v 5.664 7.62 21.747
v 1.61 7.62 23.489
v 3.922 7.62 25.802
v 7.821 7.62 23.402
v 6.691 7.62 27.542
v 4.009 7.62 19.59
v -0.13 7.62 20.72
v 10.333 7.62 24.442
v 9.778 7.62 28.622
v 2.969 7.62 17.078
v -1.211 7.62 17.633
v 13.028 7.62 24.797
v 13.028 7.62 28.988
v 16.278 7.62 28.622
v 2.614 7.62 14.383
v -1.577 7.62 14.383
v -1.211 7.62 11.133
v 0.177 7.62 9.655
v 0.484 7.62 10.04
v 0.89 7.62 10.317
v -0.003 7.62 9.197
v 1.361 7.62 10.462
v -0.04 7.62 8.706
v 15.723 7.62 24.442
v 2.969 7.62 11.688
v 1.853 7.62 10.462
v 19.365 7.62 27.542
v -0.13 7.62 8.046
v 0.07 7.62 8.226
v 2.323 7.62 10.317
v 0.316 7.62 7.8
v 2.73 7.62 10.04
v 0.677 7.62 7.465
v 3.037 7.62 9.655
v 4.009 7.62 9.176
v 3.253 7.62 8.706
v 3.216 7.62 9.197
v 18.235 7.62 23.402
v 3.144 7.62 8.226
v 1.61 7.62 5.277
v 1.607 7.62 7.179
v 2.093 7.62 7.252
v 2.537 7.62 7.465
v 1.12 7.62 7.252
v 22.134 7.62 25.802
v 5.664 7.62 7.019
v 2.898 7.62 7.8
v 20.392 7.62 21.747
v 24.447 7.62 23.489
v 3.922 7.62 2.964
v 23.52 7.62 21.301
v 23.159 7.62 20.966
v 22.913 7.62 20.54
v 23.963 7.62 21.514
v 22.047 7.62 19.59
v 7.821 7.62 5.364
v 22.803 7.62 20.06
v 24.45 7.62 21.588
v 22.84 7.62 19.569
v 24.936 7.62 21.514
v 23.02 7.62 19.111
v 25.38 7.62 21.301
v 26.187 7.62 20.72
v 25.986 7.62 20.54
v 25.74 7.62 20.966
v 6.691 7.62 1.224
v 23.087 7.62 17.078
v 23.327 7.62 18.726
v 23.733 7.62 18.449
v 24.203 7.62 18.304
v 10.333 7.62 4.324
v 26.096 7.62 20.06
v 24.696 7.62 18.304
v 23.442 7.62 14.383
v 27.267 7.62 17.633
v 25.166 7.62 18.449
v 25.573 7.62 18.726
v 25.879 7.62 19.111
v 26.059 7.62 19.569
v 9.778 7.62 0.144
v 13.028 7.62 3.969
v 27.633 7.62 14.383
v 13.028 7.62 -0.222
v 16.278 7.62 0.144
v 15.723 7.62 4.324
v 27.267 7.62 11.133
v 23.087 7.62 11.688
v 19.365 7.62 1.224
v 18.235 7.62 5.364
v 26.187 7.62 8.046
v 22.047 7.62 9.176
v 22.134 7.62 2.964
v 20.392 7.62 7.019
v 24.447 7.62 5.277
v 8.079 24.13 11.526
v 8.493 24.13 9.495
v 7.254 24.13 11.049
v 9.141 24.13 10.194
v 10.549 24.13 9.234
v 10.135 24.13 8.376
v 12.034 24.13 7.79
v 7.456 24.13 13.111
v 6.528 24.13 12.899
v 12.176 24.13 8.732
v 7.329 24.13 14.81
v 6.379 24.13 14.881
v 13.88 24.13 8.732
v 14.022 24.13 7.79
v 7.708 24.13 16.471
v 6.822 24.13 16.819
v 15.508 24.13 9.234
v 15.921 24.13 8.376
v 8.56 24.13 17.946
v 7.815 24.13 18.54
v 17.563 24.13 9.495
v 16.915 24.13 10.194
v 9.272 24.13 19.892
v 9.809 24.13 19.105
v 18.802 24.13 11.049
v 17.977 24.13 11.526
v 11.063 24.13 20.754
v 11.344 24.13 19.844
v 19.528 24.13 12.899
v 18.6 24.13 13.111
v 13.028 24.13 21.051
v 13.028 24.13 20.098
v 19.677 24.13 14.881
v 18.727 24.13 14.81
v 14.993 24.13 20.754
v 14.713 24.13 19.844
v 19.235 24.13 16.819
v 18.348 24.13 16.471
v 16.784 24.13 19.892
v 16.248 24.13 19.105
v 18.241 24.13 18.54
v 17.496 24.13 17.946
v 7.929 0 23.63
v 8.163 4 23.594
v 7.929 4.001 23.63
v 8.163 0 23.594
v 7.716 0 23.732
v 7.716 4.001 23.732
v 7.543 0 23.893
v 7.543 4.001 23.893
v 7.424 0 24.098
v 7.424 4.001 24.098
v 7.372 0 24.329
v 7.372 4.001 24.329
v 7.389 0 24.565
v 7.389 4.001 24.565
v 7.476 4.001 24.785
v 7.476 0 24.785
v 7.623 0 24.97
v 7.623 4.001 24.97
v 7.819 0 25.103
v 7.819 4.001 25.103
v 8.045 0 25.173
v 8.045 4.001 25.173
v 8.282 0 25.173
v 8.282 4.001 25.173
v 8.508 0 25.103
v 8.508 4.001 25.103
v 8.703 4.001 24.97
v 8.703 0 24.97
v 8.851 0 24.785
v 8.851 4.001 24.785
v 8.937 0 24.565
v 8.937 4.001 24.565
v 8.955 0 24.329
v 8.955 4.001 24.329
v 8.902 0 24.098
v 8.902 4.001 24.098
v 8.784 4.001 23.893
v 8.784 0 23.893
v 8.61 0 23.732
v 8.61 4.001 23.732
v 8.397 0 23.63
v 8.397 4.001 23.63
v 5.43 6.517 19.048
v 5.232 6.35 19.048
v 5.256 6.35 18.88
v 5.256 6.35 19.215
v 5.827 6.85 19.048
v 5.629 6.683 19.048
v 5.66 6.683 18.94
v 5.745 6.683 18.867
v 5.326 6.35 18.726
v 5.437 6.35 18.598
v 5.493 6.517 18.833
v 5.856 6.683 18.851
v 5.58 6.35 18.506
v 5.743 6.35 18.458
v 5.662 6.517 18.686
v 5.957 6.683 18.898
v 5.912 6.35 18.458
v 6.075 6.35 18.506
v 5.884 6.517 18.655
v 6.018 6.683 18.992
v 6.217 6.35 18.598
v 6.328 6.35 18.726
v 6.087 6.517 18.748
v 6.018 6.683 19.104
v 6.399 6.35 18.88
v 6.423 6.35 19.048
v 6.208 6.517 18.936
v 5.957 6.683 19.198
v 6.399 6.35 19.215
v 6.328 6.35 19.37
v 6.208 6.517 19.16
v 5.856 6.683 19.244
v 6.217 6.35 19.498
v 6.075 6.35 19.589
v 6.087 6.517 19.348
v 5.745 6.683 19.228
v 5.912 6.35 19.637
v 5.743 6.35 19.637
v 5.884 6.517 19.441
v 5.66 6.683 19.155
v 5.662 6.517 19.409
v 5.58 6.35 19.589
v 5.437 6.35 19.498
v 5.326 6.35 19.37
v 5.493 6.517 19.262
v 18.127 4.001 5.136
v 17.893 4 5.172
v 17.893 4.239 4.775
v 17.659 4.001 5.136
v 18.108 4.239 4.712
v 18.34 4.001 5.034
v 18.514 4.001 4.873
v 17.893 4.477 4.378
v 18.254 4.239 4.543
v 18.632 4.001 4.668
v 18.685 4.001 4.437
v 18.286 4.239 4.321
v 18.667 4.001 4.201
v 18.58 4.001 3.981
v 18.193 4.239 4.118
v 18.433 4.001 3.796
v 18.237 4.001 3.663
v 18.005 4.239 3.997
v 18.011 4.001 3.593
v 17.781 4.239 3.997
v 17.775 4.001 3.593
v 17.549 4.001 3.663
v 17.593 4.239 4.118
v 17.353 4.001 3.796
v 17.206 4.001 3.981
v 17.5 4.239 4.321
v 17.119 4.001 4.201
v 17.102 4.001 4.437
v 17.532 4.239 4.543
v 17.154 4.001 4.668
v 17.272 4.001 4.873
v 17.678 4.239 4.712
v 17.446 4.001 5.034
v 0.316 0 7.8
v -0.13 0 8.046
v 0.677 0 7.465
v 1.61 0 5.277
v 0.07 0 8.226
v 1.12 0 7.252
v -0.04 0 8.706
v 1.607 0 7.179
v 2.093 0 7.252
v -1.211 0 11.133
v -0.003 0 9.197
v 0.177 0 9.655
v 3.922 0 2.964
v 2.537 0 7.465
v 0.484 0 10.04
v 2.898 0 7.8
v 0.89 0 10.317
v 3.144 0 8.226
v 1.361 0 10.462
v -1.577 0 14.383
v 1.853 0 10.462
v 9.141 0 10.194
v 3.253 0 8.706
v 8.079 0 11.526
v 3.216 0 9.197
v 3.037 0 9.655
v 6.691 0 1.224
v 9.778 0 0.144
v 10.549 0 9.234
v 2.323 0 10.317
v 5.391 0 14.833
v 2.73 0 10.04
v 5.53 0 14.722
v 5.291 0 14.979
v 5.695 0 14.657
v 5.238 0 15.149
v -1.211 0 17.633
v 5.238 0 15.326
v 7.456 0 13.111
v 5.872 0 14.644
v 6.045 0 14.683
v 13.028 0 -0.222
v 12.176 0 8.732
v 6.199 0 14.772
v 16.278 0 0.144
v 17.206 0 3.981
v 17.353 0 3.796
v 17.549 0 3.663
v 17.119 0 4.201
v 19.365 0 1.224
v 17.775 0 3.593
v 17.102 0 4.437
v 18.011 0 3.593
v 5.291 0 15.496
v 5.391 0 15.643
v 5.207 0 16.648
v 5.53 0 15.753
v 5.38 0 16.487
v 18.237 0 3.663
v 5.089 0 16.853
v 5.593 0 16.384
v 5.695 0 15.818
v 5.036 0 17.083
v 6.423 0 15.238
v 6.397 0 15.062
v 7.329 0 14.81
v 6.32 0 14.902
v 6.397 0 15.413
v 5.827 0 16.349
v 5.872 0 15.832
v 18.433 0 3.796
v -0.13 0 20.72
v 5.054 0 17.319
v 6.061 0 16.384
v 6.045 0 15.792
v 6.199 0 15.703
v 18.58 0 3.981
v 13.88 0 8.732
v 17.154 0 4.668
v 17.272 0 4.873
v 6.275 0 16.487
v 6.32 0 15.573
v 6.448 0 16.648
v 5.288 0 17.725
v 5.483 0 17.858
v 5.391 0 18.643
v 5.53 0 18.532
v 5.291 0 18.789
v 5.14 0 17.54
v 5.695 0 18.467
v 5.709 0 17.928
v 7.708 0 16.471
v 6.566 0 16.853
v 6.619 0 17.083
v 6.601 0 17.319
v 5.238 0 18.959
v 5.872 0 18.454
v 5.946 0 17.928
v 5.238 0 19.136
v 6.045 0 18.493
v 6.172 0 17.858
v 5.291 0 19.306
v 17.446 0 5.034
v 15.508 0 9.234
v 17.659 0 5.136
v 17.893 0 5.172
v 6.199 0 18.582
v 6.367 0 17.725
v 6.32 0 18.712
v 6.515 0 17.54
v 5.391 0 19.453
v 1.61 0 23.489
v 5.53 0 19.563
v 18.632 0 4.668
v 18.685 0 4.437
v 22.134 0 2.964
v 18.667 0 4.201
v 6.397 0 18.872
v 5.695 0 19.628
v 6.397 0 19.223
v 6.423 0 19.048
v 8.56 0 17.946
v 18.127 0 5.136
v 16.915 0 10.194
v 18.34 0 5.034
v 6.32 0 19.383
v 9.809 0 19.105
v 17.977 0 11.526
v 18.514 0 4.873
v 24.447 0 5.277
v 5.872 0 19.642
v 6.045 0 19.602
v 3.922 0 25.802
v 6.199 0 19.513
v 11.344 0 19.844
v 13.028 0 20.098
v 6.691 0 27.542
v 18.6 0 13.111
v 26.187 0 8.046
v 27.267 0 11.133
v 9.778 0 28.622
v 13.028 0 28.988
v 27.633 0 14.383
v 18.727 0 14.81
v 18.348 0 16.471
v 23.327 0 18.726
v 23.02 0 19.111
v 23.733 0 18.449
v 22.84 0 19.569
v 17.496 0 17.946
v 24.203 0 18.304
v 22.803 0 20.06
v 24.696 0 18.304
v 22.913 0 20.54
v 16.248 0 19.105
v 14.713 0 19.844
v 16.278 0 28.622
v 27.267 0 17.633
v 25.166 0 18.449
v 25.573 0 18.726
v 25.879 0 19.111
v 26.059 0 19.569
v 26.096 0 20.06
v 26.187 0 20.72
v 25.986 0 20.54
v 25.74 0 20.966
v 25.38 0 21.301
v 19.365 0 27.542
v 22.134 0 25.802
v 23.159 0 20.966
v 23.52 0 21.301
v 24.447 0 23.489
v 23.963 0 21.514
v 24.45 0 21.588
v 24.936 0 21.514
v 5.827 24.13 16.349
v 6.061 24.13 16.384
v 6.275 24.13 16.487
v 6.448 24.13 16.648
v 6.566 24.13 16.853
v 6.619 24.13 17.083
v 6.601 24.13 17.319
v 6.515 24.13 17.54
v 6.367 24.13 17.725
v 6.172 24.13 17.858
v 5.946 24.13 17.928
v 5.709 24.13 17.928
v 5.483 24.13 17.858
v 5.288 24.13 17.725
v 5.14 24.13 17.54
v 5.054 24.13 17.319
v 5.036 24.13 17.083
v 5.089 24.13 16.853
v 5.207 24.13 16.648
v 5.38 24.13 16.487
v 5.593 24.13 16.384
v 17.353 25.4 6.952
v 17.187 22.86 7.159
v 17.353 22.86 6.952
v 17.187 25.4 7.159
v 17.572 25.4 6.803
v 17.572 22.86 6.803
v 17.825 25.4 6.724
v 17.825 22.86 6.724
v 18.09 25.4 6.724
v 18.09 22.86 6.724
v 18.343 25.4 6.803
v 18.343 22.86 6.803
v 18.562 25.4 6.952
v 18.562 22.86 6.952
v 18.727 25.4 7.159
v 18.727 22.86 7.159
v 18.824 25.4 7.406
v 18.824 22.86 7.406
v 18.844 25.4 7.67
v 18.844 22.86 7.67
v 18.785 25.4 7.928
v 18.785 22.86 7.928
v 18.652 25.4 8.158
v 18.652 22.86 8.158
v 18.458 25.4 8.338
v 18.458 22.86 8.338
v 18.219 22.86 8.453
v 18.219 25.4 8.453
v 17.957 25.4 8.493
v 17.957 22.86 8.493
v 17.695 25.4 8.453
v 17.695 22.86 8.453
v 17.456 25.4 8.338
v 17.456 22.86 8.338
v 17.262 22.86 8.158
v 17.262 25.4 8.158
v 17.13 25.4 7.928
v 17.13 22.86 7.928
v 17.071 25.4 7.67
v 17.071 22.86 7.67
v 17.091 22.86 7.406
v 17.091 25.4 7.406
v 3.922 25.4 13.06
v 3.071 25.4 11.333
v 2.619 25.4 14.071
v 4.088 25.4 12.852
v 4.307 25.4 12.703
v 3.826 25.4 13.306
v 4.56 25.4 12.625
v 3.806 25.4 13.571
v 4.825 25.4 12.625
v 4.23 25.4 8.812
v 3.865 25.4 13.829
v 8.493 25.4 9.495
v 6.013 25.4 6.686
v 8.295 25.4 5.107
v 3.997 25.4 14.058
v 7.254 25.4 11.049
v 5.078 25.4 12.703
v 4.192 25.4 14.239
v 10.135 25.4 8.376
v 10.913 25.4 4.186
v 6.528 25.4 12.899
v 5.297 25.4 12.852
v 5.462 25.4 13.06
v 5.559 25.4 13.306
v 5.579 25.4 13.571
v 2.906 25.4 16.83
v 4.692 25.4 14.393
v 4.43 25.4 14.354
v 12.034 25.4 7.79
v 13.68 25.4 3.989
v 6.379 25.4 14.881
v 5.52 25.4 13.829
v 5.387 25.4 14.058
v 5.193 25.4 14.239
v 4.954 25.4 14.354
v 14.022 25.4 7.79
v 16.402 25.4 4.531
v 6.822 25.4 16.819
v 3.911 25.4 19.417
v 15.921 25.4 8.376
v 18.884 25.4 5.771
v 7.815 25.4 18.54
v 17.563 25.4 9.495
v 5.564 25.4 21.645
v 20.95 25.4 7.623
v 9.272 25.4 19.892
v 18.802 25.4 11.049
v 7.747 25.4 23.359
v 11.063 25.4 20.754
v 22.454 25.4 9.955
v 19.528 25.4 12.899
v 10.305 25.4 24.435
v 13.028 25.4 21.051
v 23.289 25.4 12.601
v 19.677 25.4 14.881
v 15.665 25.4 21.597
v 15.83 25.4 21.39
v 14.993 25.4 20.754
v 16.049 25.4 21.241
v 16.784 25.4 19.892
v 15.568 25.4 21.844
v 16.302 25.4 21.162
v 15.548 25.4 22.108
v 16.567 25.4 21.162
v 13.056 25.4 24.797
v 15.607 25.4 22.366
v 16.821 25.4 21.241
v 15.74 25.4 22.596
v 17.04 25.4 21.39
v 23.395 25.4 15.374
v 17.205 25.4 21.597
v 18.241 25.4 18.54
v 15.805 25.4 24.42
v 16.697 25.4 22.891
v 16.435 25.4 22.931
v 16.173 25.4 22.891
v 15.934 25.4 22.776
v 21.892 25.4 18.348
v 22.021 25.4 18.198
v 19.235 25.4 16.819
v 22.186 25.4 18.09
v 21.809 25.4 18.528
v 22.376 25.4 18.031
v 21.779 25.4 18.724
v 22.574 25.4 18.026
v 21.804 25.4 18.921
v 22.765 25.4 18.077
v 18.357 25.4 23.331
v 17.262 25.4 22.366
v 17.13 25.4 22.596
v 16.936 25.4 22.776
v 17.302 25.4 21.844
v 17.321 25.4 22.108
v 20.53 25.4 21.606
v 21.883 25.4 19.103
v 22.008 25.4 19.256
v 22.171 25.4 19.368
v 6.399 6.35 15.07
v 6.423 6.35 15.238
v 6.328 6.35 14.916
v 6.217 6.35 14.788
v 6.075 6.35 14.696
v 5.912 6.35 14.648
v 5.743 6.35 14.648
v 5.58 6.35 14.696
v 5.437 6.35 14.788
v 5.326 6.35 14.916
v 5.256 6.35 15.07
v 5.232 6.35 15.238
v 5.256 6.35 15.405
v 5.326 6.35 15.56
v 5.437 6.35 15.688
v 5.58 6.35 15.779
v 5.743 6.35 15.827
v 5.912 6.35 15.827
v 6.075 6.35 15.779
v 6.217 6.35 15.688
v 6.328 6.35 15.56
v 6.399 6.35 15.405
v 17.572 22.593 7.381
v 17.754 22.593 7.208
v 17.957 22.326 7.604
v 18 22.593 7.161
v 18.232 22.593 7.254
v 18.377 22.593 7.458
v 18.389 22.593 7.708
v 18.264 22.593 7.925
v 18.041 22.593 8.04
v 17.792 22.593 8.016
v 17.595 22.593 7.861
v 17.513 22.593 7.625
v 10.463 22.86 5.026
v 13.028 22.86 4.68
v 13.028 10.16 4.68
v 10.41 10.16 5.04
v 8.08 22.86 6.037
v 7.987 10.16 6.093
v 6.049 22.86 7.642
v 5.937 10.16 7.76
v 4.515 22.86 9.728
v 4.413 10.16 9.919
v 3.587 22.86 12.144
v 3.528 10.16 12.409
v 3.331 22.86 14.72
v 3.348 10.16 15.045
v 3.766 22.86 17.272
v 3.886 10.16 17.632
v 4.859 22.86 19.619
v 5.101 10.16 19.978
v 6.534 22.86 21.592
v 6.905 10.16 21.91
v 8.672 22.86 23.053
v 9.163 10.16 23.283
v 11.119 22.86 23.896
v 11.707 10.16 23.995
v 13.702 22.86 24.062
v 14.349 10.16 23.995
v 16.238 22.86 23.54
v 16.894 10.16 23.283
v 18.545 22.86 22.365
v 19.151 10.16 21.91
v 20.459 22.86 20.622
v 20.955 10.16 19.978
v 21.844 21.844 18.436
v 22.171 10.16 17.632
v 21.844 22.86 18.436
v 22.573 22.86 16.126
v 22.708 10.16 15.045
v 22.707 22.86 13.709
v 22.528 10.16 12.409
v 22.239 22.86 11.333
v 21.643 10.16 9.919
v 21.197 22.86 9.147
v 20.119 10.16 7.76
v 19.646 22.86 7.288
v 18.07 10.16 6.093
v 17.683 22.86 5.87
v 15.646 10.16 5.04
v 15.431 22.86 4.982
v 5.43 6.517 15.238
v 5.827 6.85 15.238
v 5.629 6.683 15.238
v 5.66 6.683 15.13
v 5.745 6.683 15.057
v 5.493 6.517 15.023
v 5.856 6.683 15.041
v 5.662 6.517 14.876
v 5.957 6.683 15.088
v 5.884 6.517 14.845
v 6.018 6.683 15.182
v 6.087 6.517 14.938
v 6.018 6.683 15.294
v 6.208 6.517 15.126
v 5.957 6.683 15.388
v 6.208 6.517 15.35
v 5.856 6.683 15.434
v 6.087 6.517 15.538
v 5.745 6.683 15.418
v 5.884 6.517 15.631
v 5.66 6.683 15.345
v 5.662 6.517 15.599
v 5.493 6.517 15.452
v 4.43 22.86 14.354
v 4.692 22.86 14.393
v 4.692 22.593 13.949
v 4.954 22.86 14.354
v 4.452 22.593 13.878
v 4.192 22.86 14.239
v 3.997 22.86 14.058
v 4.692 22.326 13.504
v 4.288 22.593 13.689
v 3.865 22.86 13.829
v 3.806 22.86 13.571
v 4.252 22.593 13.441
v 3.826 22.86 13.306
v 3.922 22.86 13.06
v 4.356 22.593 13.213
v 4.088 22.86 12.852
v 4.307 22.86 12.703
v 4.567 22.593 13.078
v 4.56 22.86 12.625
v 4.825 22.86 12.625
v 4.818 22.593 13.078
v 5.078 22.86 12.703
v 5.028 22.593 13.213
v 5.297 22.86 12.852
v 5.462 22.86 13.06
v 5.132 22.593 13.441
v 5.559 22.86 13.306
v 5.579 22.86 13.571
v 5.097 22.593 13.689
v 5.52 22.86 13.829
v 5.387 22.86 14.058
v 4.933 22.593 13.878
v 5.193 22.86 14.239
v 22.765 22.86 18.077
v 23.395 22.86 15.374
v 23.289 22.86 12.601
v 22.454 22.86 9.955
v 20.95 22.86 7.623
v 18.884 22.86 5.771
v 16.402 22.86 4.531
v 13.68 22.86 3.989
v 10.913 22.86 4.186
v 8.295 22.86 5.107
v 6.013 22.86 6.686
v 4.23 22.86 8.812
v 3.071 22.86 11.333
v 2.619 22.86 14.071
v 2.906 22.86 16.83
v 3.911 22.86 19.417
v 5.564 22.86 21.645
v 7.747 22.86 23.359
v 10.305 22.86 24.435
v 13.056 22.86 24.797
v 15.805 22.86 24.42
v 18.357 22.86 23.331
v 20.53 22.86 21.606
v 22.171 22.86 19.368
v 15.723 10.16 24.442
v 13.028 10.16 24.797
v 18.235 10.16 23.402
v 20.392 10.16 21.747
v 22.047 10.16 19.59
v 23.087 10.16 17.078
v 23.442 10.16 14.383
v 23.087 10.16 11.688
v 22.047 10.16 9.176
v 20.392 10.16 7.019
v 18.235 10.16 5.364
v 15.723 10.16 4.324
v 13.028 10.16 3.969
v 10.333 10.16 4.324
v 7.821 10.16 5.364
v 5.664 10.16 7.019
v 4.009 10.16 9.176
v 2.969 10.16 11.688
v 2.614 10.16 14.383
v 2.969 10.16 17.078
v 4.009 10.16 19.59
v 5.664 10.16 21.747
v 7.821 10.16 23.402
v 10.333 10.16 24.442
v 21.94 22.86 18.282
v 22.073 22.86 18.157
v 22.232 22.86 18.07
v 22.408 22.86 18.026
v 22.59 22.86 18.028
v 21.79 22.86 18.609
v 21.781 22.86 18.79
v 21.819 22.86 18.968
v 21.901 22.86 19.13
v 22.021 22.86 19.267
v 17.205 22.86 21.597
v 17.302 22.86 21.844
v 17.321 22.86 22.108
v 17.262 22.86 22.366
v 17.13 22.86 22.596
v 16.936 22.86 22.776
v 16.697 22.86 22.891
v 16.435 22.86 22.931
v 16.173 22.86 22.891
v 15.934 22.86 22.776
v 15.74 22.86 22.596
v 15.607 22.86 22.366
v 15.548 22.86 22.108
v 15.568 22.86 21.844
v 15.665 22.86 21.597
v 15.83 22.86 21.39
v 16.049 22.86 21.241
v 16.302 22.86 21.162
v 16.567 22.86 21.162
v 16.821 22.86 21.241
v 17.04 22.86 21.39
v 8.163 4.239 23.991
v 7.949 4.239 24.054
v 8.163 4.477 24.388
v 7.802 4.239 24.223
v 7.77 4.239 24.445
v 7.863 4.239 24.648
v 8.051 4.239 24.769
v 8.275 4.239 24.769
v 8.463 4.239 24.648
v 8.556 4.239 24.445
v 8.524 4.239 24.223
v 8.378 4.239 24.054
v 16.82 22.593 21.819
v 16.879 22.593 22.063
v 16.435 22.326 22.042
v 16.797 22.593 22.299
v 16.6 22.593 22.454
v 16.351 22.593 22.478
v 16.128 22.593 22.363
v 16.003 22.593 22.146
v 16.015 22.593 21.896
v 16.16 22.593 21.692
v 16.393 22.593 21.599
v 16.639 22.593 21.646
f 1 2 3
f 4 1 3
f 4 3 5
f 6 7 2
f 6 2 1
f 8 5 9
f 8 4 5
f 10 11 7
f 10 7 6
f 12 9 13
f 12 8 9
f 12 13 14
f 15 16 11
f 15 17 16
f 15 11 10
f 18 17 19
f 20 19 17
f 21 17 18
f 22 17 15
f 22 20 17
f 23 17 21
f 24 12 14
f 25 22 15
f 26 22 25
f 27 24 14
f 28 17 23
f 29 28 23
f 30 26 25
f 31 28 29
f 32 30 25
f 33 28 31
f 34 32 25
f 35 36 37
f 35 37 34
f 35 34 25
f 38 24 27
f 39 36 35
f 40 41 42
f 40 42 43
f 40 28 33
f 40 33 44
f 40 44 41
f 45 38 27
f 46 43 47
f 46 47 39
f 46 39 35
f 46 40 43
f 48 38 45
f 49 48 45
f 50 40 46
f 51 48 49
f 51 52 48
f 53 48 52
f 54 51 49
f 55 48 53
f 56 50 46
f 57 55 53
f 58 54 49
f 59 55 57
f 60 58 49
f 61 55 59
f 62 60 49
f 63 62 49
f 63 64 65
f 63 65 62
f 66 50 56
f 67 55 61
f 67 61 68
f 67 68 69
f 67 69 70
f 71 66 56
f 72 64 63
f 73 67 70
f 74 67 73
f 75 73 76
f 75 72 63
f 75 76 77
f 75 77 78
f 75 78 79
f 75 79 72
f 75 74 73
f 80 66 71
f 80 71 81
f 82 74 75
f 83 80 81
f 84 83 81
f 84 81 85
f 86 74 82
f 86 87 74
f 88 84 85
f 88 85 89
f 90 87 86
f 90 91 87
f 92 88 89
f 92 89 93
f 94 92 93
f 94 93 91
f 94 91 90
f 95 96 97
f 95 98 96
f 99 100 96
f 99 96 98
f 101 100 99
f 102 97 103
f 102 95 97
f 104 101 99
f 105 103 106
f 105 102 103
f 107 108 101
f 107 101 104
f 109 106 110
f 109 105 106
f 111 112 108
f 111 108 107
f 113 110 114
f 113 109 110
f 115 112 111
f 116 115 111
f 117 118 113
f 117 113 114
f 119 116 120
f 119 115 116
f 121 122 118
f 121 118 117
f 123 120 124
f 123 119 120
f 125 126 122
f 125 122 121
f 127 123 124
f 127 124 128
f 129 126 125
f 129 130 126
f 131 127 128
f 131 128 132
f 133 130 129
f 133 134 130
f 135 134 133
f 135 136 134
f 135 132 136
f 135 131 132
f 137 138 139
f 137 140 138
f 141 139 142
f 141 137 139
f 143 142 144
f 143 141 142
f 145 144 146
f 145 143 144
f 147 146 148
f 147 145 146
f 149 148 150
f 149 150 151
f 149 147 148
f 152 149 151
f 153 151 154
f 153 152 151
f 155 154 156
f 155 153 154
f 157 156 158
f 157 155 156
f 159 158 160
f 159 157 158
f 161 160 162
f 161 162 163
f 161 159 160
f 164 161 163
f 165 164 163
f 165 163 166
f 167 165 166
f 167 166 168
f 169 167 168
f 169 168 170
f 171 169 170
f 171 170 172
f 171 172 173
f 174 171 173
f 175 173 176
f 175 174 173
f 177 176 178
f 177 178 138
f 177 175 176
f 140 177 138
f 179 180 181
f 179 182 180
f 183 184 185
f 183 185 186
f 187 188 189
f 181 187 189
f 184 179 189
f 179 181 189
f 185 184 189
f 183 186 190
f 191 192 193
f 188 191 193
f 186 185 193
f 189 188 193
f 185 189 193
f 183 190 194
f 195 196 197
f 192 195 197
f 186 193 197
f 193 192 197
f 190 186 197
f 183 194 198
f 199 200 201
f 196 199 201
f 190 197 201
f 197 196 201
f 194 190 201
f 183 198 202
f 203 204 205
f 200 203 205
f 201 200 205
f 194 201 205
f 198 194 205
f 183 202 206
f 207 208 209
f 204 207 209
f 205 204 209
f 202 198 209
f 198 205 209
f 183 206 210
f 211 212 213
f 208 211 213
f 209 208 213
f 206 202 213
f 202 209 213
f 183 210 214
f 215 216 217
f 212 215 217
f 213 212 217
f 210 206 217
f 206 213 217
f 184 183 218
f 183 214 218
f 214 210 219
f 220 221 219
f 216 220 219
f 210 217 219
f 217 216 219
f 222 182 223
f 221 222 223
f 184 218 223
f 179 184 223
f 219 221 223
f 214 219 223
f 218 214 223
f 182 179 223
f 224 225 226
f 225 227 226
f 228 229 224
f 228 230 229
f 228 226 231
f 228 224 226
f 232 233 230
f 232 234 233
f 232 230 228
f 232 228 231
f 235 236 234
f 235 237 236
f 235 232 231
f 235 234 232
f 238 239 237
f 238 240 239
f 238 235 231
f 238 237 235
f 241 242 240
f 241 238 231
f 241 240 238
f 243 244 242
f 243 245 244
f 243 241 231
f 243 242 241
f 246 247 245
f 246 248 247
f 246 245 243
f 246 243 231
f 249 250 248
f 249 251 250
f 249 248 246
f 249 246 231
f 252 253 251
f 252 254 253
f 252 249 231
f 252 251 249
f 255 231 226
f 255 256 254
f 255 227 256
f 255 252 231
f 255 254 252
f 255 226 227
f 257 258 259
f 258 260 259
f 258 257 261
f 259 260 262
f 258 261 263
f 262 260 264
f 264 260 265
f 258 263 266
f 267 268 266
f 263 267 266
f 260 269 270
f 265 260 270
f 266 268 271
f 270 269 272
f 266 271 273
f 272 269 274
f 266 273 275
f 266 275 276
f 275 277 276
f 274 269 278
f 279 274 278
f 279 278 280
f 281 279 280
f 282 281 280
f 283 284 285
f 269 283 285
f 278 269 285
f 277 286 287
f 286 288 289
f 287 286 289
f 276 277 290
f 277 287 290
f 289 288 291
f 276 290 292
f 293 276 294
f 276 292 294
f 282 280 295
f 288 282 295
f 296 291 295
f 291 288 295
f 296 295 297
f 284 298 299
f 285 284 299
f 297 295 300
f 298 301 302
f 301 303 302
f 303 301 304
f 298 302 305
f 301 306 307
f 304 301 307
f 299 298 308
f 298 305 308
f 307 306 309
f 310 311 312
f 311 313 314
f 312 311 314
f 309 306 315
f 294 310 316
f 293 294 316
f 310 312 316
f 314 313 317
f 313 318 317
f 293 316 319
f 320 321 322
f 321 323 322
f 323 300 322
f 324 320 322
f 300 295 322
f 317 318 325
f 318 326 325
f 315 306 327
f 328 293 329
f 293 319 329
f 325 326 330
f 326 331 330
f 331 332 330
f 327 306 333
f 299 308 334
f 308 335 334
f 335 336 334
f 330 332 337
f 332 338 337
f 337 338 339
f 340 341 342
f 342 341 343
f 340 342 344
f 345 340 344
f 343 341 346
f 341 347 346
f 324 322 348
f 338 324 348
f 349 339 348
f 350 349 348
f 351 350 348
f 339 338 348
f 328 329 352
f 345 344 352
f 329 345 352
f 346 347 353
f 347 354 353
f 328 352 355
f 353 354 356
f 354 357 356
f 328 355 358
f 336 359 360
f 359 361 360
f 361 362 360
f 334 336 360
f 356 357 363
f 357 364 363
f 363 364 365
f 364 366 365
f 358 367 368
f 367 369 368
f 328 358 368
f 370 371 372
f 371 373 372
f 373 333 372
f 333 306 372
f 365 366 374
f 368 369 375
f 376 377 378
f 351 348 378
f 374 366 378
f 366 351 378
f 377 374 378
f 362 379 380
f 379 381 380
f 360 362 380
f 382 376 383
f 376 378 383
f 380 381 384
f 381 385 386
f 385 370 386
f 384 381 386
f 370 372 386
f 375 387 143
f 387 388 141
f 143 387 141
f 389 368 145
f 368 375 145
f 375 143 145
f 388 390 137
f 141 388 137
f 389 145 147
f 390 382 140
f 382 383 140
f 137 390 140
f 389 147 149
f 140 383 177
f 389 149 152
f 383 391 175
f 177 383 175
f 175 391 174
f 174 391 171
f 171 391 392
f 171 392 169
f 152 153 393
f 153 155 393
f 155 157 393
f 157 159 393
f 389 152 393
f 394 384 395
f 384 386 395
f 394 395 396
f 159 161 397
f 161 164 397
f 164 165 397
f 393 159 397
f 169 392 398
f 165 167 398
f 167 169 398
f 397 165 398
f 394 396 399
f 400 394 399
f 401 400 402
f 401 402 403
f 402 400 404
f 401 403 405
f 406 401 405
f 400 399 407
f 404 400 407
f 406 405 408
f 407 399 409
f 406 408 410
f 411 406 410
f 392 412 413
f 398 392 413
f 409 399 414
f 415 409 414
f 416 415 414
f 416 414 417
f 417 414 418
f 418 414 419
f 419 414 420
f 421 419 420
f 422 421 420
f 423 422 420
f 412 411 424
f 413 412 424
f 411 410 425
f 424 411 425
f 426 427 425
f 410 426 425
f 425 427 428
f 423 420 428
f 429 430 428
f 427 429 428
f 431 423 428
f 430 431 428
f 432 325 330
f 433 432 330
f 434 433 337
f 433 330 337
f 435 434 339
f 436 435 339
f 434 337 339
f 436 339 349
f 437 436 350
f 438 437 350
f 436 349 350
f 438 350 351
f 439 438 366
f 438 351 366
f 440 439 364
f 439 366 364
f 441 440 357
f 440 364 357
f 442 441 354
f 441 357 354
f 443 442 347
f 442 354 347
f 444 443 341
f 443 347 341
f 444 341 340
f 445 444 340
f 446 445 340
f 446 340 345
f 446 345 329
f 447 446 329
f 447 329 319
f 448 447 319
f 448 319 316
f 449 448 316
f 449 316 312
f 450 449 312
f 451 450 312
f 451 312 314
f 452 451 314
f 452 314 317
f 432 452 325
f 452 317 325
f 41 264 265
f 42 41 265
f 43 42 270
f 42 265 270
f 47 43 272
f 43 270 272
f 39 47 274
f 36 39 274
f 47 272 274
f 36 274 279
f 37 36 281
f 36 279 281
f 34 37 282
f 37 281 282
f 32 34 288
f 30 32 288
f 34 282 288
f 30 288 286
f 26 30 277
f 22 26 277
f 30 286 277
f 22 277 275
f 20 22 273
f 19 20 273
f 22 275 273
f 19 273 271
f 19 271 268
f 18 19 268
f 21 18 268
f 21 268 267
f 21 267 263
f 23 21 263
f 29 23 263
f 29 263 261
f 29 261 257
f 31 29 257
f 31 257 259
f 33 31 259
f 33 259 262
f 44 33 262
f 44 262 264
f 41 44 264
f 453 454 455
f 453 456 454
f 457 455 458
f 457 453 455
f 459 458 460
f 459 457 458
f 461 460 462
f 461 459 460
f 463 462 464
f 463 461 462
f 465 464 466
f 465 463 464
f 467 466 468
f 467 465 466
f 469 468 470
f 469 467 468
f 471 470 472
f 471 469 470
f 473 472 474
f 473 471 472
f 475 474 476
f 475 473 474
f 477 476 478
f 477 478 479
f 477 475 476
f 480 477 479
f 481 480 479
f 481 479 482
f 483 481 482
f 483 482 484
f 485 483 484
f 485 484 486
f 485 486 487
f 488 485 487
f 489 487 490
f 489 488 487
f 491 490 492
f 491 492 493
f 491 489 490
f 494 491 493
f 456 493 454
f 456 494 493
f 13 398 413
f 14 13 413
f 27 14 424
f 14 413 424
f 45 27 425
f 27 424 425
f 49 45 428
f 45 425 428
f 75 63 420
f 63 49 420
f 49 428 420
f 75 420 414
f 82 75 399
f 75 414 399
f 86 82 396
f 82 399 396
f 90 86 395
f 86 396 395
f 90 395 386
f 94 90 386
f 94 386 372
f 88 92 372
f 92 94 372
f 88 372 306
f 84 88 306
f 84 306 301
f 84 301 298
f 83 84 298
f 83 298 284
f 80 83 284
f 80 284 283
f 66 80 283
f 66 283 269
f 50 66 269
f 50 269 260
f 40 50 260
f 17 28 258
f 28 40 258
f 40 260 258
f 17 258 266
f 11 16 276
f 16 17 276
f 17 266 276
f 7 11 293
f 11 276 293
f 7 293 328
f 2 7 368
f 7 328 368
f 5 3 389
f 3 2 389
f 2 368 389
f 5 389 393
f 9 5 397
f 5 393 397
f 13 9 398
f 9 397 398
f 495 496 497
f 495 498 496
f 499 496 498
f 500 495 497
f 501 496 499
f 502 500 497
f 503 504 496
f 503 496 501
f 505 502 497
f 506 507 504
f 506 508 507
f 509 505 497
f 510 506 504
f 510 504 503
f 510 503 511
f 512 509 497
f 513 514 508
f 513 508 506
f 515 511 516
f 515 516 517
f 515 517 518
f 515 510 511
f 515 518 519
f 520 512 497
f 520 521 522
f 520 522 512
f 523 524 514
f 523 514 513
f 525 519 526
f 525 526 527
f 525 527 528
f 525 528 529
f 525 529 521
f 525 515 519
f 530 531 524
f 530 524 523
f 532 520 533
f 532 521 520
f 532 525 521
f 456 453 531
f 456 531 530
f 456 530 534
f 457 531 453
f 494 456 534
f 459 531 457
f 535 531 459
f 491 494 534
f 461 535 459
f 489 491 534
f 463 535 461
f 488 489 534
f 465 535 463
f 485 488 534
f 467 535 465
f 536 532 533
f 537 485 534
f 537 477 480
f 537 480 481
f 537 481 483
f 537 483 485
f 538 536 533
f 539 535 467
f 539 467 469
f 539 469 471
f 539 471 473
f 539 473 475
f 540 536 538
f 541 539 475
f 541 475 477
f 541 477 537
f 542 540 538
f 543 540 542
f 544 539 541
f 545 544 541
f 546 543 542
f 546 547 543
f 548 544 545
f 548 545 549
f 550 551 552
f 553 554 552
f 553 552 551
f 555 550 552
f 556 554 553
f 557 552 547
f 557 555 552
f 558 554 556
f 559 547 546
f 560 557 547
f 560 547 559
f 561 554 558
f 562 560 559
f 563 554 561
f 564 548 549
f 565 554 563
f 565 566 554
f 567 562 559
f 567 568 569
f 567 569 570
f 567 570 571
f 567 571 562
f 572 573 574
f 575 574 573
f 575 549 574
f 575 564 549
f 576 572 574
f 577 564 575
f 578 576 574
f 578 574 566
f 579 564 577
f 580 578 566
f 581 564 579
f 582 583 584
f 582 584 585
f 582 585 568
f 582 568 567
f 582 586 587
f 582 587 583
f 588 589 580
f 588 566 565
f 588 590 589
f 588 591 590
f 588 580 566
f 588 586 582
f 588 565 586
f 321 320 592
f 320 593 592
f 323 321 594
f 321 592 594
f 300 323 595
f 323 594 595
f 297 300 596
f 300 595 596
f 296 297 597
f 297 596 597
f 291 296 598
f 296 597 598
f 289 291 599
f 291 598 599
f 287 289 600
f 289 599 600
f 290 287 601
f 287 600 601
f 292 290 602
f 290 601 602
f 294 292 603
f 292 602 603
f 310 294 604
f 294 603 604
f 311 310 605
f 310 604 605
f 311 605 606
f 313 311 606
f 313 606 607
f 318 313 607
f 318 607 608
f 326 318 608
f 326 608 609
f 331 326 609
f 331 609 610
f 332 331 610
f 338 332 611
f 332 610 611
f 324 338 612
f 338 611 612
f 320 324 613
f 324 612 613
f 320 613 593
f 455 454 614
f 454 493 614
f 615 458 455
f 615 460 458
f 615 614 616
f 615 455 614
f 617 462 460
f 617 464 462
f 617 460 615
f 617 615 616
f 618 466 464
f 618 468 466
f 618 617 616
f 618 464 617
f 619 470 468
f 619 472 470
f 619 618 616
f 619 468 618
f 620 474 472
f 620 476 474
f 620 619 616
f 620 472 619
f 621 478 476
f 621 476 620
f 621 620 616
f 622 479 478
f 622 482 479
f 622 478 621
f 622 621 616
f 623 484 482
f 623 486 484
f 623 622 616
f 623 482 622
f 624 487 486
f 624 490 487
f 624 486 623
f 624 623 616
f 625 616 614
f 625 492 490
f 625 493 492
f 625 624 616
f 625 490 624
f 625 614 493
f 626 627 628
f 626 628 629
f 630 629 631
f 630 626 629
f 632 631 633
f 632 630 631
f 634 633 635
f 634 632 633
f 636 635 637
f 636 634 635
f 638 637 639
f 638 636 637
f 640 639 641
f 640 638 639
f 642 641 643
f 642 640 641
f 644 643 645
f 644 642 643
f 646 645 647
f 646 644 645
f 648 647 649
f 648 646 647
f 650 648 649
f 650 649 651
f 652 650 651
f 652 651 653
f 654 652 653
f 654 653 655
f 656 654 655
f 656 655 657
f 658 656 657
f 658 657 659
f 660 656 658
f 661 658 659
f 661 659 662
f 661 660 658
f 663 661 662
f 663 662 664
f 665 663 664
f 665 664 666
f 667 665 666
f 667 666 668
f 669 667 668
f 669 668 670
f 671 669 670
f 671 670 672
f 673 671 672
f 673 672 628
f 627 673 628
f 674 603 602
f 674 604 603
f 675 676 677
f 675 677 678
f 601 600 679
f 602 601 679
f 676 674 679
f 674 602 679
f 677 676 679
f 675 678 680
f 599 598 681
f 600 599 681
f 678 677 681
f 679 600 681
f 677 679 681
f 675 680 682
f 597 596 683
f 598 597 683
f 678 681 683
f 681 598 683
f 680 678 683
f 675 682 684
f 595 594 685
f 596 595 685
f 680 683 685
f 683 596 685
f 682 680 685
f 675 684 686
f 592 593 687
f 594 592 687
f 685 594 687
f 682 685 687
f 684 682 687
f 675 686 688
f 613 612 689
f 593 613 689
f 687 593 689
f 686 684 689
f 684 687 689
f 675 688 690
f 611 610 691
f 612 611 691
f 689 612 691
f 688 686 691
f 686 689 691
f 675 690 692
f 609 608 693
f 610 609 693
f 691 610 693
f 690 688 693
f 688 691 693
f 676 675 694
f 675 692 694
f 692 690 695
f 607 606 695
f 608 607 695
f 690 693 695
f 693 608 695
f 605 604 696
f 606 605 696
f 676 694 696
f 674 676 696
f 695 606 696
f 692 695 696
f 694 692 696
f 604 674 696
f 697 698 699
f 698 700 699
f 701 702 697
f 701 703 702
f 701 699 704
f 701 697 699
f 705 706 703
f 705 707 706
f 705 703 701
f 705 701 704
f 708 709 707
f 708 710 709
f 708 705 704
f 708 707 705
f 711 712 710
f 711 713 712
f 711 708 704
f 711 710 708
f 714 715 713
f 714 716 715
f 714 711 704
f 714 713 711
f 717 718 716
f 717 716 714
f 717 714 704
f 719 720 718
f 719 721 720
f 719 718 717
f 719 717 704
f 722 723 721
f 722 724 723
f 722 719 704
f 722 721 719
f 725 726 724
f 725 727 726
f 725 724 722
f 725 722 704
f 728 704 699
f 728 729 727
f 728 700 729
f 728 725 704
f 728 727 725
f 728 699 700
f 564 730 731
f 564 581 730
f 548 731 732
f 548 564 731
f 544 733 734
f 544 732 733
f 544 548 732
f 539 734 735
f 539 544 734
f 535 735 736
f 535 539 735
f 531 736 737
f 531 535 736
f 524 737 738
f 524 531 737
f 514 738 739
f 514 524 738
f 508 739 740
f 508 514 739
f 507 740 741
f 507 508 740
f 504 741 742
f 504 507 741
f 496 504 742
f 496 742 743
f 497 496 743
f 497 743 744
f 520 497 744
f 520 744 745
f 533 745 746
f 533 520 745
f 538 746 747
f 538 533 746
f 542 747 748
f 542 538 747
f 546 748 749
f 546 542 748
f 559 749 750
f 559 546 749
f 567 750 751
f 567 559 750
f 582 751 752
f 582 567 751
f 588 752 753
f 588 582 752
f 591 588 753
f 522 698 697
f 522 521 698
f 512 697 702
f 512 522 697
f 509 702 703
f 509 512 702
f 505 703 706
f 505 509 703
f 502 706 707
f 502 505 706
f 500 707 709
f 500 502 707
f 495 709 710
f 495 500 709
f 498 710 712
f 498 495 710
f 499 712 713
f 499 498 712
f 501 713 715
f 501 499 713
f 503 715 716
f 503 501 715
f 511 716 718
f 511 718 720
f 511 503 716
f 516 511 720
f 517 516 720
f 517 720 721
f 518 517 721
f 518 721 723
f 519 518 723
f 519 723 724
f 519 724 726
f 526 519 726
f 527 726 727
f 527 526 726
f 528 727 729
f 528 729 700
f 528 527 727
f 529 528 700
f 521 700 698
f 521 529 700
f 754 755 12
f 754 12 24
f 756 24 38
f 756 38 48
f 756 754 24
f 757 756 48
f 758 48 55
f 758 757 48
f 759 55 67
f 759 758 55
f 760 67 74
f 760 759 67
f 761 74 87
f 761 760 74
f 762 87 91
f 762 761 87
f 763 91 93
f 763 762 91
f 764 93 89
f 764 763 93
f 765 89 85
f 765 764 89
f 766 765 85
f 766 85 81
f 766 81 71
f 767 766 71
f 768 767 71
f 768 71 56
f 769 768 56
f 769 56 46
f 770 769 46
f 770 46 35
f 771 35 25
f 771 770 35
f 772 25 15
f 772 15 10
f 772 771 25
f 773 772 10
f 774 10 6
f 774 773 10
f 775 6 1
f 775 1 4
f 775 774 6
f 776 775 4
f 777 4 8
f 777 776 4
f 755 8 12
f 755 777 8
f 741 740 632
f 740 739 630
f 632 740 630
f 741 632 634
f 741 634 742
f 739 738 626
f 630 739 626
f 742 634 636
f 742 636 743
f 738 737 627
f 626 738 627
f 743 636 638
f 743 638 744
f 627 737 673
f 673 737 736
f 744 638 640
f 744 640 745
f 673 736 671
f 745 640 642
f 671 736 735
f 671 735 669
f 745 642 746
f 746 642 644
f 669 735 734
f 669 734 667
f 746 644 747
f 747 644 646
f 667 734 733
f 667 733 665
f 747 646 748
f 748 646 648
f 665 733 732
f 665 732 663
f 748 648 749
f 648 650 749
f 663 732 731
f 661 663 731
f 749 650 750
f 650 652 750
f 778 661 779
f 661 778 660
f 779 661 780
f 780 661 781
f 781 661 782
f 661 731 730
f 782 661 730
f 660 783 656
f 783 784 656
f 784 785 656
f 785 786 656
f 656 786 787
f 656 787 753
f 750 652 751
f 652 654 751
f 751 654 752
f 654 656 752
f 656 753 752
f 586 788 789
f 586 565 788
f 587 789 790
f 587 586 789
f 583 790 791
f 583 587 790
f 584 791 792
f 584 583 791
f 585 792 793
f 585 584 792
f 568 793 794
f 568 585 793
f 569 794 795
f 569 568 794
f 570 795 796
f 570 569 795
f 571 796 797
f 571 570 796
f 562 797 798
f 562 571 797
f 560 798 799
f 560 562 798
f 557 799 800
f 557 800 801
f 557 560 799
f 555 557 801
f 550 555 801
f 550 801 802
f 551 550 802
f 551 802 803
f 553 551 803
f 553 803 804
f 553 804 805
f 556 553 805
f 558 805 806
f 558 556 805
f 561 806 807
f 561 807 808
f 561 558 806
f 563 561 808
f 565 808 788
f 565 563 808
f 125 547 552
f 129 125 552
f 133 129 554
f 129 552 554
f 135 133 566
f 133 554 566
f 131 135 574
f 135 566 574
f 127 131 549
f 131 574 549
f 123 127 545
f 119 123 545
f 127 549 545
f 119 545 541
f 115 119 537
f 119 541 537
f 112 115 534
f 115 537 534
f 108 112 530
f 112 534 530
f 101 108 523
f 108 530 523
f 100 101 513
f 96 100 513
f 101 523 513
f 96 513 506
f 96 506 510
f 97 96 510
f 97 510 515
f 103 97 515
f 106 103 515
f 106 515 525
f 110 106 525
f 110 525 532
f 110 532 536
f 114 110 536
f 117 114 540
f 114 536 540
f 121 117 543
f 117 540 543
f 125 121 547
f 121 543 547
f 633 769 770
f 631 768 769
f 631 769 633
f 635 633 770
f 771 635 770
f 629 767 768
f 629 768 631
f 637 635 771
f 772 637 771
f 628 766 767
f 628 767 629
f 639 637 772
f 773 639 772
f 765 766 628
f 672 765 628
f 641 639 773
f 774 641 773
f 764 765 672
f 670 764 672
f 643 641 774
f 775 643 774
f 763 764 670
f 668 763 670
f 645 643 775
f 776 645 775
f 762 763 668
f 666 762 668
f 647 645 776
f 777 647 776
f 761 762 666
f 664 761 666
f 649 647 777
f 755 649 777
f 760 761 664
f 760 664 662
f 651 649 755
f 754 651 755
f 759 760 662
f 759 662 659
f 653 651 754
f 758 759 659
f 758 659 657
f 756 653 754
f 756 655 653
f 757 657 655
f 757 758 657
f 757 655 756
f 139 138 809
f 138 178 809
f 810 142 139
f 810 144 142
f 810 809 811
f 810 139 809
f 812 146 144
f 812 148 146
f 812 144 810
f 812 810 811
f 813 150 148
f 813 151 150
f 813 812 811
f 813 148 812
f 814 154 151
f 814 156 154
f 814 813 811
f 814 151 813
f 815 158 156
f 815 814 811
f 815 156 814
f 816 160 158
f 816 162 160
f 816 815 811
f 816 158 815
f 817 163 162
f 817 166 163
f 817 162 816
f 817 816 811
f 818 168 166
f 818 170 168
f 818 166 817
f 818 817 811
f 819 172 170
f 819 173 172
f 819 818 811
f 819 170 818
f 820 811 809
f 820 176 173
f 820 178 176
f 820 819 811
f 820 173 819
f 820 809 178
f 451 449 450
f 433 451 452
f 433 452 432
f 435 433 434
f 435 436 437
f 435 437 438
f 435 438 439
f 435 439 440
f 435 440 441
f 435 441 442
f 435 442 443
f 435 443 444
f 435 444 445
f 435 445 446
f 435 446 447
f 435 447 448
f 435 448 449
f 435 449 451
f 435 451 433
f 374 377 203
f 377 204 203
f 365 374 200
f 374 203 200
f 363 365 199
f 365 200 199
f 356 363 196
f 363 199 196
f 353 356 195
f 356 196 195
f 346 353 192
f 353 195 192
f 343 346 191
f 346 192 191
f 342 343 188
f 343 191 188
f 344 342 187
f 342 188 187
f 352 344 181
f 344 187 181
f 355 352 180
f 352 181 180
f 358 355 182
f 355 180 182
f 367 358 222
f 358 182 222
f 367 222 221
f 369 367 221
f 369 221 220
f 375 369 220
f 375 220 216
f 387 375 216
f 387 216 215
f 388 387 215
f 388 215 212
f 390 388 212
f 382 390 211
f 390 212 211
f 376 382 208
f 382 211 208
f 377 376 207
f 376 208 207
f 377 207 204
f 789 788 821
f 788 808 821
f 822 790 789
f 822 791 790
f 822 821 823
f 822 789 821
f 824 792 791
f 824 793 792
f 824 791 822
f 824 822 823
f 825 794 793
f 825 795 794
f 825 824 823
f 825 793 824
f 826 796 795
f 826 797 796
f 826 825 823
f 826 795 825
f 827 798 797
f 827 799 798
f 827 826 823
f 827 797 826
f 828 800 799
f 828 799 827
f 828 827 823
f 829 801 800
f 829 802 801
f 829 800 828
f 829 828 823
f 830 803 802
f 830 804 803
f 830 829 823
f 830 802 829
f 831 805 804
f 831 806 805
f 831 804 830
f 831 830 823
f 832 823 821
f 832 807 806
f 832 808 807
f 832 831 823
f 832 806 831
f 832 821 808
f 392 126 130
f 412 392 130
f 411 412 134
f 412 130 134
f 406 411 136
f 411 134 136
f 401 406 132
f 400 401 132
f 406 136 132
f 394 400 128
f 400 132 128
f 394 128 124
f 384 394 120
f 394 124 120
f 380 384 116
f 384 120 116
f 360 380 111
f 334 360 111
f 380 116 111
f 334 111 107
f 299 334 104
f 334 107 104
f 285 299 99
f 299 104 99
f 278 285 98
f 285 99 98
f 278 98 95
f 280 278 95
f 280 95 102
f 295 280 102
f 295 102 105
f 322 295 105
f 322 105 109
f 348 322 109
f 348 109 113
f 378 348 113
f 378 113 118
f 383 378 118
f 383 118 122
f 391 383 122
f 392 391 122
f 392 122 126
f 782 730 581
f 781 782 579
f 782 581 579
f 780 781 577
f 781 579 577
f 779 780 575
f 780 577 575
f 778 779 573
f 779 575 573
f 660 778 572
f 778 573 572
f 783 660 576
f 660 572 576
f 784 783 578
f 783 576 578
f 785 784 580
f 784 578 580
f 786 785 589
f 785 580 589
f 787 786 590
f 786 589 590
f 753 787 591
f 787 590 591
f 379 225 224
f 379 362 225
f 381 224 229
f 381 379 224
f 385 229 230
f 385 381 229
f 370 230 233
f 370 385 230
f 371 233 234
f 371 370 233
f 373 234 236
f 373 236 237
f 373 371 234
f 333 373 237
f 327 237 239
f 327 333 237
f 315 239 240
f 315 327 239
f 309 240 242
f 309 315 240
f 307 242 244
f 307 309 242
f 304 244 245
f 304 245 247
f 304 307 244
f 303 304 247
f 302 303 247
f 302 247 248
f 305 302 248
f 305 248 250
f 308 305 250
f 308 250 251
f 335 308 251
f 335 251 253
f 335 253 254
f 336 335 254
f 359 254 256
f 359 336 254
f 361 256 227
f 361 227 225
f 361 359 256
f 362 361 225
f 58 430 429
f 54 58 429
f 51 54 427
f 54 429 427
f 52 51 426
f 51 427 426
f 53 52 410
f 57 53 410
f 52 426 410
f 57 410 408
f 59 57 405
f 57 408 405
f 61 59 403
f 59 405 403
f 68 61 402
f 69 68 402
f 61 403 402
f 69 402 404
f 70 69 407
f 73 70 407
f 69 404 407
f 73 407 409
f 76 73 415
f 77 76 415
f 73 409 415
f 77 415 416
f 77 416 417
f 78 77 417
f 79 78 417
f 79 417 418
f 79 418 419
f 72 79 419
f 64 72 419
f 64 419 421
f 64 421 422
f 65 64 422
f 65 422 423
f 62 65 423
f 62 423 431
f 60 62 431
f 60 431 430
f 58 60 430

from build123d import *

# Parameters (mm, degrees)
SKETCH1_R                     = 14.605
BOSS_EXTRUDE2_DEPTH           = 25.4
SKETCH10_R                    = 5.715
CUT_EXTRUDE5_DEPTH            = 48.424233935
SKETCH11_R                    = 6.6675
CUT_EXTRUDE6_DEPTH            = 1.27
SKETCH12_OUTSIDE_W            = 40.908
SKETCH12_OUTSIDE_H            = 40.908
SKETCH12_OUTSIDE_R            = 10.414
CUT_EXTRUDE7_DEPTH            = 17.78
CIRPATTERN1_COUNT             = 3
CIRPATTERN2_COUNT             = 2
SKETCH26_R                    = 1.651
CUT_EXTRUDE8_DEPTH            = 8.89
CIRPATTERN3_COUNT             = 2
SKETCH27_R                    = 0.79375
CUT_EXTRUDE9_DEPTH            = 24.13
TAP_DRILL_FOR_0_80_TAP3_D     = 1.19126
TAP_DRILL_FOR_0_80_TAP3_DEPTH = 6.35
TAP_DRILL_FOR_0_80_TAP3_TIP   = 0.499792913
CUT_EXTRUDE10_START           = 15.24
SKETCH33_R                    = 10.414
SKETCH33_R_2                  = 9.7028
CUT_EXTRUDE10_DEPTH           = 15.24
BOSS_EXTRUDE3_START           = 2.54
SKETCH33_2_R                  = 10.414
SKETCH33_2_R_2                = 9.7028
BOSS_EXTRUDE3_DEPTH           = 2.54
SKETCH35_R                    = 0.7112
CUT_EXTRUDE11_DEPTH           = 3.556


with BuildPart() as part:
    # Sketch1 → Boss-Extrude2 (new body)
    with BuildSketch(Plane(origin=(0, 0, 0), x_dir=(1, 0, 0), z_dir=(0, 1, 0))):
        with Locations((13.028153923, -14.383045271)):
            Circle(SKETCH1_R)
    extrude(amount=BOSS_EXTRUDE2_DEPTH)

    # Sketch10 → Cut-Extrude5 (cut, through all)
    with BuildSketch(Plane(origin=(0, 25.4, 0), x_dir=(1, 0, 0), z_dir=(0, 1, 0))):
        with Locations((13.028153923, -14.383045271)):
            Circle(SKETCH10_R)
    extrude(amount=-CUT_EXTRUDE5_DEPTH, mode=Mode.SUBTRACT)

    # Sketch11 → Cut-Extrude6 (cut)
    with BuildSketch(Plane(origin=(0, 25.4, 0), x_dir=(1, 0, 0), z_dir=(0, 1, 0))):
        with Locations((13.028153923, -14.383045271)):
            Circle(SKETCH11_R)
    extrude(amount=-CUT_EXTRUDE6_DEPTH, mode=Mode.SUBTRACT)

    # Sketch12 outside → Cut-Extrude7 (cut)
    with BuildSketch(Plane(origin=(0, 25.4, 0), x_dir=(1, 0, 0), z_dir=(0, 1, 0))):
        with Locations((13.028, -14.383)):
            Rectangle(SKETCH12_OUTSIDE_W, SKETCH12_OUTSIDE_H)
        with Locations((13.028153923, -14.383045271)):
            Circle(SKETCH12_OUTSIDE_R, mode=Mode.SUBTRACT)
    extrude(amount=-CUT_EXTRUDE7_DEPTH, mode=Mode.SUBTRACT)

    # Sketch17 → #50 (0.07) Diameter Hole1 (revolve, cut)
    with BuildSketch(Plane(origin=(4.692367215, 25.4, 13.504077717), x_dir=(0, 0, 1), z_dir=(1, 0, 0))):
        Polygon((0, 0), (0, 3.07416509), (0.889, 2.54), (0.889, 0), align=None)
    f_50_0_07_diameter_hole1 = revolve(axis=Axis((4.692367215, 31.75, 13.504077717), (0, -1, 0)), mode=Mode.SUBTRACT)

    # CirPattern1: #50 (0.07) Diameter Hole1 ×3 about axis
    cirpattern1_axis = Axis((13.028153923, 7.62, 14.383045271), (0, 1, 0))
    for i in range(1, CIRPATTERN1_COUNT):
        add(f_50_0_07_diameter_hole1.rotate(cirpattern1_axis, i * 360 / CIRPATTERN1_COUNT), mode=Mode.SUBTRACT)

    # Sketch24 → 1/16 (0.0625) Diameter Hole2 (revolve, cut)
    with BuildSketch(Plane(origin=(8.163266455, 0, 24.388191195), x_dir=(0, 0, -1), z_dir=(1, 0, 0))):
        Polygon((0, 0), (0, 4.477433116), (0.79375, 4.0005), (0.79375, 0), align=None)
    f_1_16_0_0625_diameter_hole2 = revolve(axis=Axis((8.163266455, -6.35, 24.388191195), (0, 1, 0)), mode=Mode.SUBTRACT)

    # CirPattern2: 1/16 (0.0625) Diameter Hole2 ×2 about axis
    cirpattern2_axis = Axis((13.028153923, 25.4, 14.383045271), (0, -1, 0))
    for i in range(1, CIRPATTERN2_COUNT):
        add(f_1_16_0_0625_diameter_hole2.rotate(cirpattern2_axis, i * 360 / CIRPATTERN2_COUNT), mode=Mode.SUBTRACT)

    # Sketch26 → Cut-Extrude8 (cut)
    with BuildSketch(Plane(origin=(0, 0, 0), x_dir=(-1, 0, 0), z_dir=(0, -1, 0))):
        with Locations((-1.606754466, -8.829520764)):
            Circle(SKETCH26_R)
    cut_extrude8 = extrude(amount=-CUT_EXTRUDE8_DEPTH, mode=Mode.SUBTRACT)

    # CirPattern3: Cut-Extrude8 ×2 about axis
    cirpattern3_axis = Axis((13.028153923, 25.4, 14.383045271), (0, -1, 0))
    for i in range(1, CIRPATTERN3_COUNT):
        add(cut_extrude8.rotate(cirpattern3_axis, i * 360 / CIRPATTERN3_COUNT), mode=Mode.SUBTRACT)

    # Sketch27 → Cut-Extrude9 (cut)
    with BuildSketch(Plane(origin=(0, 0, 0), x_dir=(-1, 0, 0), z_dir=(0, -1, 0))):
        with Locations((-5.827402564, -17.142659866)):
            Circle(SKETCH27_R)
    extrude(amount=-CUT_EXTRUDE9_DEPTH, mode=Mode.SUBTRACT)

    # Tap Drill for #0-80 Tap3
    with Locations(Plane(origin=(0, 0, 0), x_dir=(-1, 0, 0), z_dir=(0, -1, 0))):
        with Locations((-5.827402564, -15.237659866), (-5.827402564, -19.047659866)):
            Hole(TAP_DRILL_FOR_0_80_TAP3_D / 2, depth=TAP_DRILL_FOR_0_80_TAP3_DEPTH)
            with Locations((0, 0, -(TAP_DRILL_FOR_0_80_TAP3_DEPTH + TAP_DRILL_FOR_0_80_TAP3_TIP / 2))):  # 100° drill point
                Cone(0, TAP_DRILL_FOR_0_80_TAP3_D / 2, TAP_DRILL_FOR_0_80_TAP3_TIP, mode=Mode.SUBTRACT)

    # Sketch33 → Cut-Extrude10 (cut)
    with BuildSketch(Plane(origin=(0, 7.62, 0), x_dir=(1, 0, 0), z_dir=(0, 1, 0)).offset(CUT_EXTRUDE10_START)):
        with Locations((13.028153923, -14.383045271)):
            Circle(SKETCH33_R)
        with Locations((13.028153923, -14.383045271)):
            Circle(SKETCH33_R_2, mode=Mode.SUBTRACT)
    extrude(amount=-CUT_EXTRUDE10_DEPTH, mode=Mode.SUBTRACT)

    # Sketch33<2> → Boss-Extrude3 (add)
    with BuildSketch(Plane(origin=(0, 7.62, 0), x_dir=(1, 0, 0), z_dir=(0, 1, 0)).offset(BOSS_EXTRUDE3_START)):
        with Locations((13.028153923, -14.383045271)):
            Circle(SKETCH33_2_R)
        with Locations((13.028153923, -14.383045271)):
            Circle(SKETCH33_2_R_2, mode=Mode.SUBTRACT)
    extrude(amount=-BOSS_EXTRUDE3_DEPTH)

    # Sketch35 → Cut-Extrude11 (cut)
    with BuildSketch(Plane(origin=(0, 25.4, 0), x_dir=(1, 0, 0), z_dir=(0, 1, 0))):
        with Locations((22.490332014, -18.732594877)):
            Circle(SKETCH35_R)
    extrude(amount=-CUT_EXTRUDE11_DEPTH, mode=Mode.SUBTRACT)


solid = part.part
